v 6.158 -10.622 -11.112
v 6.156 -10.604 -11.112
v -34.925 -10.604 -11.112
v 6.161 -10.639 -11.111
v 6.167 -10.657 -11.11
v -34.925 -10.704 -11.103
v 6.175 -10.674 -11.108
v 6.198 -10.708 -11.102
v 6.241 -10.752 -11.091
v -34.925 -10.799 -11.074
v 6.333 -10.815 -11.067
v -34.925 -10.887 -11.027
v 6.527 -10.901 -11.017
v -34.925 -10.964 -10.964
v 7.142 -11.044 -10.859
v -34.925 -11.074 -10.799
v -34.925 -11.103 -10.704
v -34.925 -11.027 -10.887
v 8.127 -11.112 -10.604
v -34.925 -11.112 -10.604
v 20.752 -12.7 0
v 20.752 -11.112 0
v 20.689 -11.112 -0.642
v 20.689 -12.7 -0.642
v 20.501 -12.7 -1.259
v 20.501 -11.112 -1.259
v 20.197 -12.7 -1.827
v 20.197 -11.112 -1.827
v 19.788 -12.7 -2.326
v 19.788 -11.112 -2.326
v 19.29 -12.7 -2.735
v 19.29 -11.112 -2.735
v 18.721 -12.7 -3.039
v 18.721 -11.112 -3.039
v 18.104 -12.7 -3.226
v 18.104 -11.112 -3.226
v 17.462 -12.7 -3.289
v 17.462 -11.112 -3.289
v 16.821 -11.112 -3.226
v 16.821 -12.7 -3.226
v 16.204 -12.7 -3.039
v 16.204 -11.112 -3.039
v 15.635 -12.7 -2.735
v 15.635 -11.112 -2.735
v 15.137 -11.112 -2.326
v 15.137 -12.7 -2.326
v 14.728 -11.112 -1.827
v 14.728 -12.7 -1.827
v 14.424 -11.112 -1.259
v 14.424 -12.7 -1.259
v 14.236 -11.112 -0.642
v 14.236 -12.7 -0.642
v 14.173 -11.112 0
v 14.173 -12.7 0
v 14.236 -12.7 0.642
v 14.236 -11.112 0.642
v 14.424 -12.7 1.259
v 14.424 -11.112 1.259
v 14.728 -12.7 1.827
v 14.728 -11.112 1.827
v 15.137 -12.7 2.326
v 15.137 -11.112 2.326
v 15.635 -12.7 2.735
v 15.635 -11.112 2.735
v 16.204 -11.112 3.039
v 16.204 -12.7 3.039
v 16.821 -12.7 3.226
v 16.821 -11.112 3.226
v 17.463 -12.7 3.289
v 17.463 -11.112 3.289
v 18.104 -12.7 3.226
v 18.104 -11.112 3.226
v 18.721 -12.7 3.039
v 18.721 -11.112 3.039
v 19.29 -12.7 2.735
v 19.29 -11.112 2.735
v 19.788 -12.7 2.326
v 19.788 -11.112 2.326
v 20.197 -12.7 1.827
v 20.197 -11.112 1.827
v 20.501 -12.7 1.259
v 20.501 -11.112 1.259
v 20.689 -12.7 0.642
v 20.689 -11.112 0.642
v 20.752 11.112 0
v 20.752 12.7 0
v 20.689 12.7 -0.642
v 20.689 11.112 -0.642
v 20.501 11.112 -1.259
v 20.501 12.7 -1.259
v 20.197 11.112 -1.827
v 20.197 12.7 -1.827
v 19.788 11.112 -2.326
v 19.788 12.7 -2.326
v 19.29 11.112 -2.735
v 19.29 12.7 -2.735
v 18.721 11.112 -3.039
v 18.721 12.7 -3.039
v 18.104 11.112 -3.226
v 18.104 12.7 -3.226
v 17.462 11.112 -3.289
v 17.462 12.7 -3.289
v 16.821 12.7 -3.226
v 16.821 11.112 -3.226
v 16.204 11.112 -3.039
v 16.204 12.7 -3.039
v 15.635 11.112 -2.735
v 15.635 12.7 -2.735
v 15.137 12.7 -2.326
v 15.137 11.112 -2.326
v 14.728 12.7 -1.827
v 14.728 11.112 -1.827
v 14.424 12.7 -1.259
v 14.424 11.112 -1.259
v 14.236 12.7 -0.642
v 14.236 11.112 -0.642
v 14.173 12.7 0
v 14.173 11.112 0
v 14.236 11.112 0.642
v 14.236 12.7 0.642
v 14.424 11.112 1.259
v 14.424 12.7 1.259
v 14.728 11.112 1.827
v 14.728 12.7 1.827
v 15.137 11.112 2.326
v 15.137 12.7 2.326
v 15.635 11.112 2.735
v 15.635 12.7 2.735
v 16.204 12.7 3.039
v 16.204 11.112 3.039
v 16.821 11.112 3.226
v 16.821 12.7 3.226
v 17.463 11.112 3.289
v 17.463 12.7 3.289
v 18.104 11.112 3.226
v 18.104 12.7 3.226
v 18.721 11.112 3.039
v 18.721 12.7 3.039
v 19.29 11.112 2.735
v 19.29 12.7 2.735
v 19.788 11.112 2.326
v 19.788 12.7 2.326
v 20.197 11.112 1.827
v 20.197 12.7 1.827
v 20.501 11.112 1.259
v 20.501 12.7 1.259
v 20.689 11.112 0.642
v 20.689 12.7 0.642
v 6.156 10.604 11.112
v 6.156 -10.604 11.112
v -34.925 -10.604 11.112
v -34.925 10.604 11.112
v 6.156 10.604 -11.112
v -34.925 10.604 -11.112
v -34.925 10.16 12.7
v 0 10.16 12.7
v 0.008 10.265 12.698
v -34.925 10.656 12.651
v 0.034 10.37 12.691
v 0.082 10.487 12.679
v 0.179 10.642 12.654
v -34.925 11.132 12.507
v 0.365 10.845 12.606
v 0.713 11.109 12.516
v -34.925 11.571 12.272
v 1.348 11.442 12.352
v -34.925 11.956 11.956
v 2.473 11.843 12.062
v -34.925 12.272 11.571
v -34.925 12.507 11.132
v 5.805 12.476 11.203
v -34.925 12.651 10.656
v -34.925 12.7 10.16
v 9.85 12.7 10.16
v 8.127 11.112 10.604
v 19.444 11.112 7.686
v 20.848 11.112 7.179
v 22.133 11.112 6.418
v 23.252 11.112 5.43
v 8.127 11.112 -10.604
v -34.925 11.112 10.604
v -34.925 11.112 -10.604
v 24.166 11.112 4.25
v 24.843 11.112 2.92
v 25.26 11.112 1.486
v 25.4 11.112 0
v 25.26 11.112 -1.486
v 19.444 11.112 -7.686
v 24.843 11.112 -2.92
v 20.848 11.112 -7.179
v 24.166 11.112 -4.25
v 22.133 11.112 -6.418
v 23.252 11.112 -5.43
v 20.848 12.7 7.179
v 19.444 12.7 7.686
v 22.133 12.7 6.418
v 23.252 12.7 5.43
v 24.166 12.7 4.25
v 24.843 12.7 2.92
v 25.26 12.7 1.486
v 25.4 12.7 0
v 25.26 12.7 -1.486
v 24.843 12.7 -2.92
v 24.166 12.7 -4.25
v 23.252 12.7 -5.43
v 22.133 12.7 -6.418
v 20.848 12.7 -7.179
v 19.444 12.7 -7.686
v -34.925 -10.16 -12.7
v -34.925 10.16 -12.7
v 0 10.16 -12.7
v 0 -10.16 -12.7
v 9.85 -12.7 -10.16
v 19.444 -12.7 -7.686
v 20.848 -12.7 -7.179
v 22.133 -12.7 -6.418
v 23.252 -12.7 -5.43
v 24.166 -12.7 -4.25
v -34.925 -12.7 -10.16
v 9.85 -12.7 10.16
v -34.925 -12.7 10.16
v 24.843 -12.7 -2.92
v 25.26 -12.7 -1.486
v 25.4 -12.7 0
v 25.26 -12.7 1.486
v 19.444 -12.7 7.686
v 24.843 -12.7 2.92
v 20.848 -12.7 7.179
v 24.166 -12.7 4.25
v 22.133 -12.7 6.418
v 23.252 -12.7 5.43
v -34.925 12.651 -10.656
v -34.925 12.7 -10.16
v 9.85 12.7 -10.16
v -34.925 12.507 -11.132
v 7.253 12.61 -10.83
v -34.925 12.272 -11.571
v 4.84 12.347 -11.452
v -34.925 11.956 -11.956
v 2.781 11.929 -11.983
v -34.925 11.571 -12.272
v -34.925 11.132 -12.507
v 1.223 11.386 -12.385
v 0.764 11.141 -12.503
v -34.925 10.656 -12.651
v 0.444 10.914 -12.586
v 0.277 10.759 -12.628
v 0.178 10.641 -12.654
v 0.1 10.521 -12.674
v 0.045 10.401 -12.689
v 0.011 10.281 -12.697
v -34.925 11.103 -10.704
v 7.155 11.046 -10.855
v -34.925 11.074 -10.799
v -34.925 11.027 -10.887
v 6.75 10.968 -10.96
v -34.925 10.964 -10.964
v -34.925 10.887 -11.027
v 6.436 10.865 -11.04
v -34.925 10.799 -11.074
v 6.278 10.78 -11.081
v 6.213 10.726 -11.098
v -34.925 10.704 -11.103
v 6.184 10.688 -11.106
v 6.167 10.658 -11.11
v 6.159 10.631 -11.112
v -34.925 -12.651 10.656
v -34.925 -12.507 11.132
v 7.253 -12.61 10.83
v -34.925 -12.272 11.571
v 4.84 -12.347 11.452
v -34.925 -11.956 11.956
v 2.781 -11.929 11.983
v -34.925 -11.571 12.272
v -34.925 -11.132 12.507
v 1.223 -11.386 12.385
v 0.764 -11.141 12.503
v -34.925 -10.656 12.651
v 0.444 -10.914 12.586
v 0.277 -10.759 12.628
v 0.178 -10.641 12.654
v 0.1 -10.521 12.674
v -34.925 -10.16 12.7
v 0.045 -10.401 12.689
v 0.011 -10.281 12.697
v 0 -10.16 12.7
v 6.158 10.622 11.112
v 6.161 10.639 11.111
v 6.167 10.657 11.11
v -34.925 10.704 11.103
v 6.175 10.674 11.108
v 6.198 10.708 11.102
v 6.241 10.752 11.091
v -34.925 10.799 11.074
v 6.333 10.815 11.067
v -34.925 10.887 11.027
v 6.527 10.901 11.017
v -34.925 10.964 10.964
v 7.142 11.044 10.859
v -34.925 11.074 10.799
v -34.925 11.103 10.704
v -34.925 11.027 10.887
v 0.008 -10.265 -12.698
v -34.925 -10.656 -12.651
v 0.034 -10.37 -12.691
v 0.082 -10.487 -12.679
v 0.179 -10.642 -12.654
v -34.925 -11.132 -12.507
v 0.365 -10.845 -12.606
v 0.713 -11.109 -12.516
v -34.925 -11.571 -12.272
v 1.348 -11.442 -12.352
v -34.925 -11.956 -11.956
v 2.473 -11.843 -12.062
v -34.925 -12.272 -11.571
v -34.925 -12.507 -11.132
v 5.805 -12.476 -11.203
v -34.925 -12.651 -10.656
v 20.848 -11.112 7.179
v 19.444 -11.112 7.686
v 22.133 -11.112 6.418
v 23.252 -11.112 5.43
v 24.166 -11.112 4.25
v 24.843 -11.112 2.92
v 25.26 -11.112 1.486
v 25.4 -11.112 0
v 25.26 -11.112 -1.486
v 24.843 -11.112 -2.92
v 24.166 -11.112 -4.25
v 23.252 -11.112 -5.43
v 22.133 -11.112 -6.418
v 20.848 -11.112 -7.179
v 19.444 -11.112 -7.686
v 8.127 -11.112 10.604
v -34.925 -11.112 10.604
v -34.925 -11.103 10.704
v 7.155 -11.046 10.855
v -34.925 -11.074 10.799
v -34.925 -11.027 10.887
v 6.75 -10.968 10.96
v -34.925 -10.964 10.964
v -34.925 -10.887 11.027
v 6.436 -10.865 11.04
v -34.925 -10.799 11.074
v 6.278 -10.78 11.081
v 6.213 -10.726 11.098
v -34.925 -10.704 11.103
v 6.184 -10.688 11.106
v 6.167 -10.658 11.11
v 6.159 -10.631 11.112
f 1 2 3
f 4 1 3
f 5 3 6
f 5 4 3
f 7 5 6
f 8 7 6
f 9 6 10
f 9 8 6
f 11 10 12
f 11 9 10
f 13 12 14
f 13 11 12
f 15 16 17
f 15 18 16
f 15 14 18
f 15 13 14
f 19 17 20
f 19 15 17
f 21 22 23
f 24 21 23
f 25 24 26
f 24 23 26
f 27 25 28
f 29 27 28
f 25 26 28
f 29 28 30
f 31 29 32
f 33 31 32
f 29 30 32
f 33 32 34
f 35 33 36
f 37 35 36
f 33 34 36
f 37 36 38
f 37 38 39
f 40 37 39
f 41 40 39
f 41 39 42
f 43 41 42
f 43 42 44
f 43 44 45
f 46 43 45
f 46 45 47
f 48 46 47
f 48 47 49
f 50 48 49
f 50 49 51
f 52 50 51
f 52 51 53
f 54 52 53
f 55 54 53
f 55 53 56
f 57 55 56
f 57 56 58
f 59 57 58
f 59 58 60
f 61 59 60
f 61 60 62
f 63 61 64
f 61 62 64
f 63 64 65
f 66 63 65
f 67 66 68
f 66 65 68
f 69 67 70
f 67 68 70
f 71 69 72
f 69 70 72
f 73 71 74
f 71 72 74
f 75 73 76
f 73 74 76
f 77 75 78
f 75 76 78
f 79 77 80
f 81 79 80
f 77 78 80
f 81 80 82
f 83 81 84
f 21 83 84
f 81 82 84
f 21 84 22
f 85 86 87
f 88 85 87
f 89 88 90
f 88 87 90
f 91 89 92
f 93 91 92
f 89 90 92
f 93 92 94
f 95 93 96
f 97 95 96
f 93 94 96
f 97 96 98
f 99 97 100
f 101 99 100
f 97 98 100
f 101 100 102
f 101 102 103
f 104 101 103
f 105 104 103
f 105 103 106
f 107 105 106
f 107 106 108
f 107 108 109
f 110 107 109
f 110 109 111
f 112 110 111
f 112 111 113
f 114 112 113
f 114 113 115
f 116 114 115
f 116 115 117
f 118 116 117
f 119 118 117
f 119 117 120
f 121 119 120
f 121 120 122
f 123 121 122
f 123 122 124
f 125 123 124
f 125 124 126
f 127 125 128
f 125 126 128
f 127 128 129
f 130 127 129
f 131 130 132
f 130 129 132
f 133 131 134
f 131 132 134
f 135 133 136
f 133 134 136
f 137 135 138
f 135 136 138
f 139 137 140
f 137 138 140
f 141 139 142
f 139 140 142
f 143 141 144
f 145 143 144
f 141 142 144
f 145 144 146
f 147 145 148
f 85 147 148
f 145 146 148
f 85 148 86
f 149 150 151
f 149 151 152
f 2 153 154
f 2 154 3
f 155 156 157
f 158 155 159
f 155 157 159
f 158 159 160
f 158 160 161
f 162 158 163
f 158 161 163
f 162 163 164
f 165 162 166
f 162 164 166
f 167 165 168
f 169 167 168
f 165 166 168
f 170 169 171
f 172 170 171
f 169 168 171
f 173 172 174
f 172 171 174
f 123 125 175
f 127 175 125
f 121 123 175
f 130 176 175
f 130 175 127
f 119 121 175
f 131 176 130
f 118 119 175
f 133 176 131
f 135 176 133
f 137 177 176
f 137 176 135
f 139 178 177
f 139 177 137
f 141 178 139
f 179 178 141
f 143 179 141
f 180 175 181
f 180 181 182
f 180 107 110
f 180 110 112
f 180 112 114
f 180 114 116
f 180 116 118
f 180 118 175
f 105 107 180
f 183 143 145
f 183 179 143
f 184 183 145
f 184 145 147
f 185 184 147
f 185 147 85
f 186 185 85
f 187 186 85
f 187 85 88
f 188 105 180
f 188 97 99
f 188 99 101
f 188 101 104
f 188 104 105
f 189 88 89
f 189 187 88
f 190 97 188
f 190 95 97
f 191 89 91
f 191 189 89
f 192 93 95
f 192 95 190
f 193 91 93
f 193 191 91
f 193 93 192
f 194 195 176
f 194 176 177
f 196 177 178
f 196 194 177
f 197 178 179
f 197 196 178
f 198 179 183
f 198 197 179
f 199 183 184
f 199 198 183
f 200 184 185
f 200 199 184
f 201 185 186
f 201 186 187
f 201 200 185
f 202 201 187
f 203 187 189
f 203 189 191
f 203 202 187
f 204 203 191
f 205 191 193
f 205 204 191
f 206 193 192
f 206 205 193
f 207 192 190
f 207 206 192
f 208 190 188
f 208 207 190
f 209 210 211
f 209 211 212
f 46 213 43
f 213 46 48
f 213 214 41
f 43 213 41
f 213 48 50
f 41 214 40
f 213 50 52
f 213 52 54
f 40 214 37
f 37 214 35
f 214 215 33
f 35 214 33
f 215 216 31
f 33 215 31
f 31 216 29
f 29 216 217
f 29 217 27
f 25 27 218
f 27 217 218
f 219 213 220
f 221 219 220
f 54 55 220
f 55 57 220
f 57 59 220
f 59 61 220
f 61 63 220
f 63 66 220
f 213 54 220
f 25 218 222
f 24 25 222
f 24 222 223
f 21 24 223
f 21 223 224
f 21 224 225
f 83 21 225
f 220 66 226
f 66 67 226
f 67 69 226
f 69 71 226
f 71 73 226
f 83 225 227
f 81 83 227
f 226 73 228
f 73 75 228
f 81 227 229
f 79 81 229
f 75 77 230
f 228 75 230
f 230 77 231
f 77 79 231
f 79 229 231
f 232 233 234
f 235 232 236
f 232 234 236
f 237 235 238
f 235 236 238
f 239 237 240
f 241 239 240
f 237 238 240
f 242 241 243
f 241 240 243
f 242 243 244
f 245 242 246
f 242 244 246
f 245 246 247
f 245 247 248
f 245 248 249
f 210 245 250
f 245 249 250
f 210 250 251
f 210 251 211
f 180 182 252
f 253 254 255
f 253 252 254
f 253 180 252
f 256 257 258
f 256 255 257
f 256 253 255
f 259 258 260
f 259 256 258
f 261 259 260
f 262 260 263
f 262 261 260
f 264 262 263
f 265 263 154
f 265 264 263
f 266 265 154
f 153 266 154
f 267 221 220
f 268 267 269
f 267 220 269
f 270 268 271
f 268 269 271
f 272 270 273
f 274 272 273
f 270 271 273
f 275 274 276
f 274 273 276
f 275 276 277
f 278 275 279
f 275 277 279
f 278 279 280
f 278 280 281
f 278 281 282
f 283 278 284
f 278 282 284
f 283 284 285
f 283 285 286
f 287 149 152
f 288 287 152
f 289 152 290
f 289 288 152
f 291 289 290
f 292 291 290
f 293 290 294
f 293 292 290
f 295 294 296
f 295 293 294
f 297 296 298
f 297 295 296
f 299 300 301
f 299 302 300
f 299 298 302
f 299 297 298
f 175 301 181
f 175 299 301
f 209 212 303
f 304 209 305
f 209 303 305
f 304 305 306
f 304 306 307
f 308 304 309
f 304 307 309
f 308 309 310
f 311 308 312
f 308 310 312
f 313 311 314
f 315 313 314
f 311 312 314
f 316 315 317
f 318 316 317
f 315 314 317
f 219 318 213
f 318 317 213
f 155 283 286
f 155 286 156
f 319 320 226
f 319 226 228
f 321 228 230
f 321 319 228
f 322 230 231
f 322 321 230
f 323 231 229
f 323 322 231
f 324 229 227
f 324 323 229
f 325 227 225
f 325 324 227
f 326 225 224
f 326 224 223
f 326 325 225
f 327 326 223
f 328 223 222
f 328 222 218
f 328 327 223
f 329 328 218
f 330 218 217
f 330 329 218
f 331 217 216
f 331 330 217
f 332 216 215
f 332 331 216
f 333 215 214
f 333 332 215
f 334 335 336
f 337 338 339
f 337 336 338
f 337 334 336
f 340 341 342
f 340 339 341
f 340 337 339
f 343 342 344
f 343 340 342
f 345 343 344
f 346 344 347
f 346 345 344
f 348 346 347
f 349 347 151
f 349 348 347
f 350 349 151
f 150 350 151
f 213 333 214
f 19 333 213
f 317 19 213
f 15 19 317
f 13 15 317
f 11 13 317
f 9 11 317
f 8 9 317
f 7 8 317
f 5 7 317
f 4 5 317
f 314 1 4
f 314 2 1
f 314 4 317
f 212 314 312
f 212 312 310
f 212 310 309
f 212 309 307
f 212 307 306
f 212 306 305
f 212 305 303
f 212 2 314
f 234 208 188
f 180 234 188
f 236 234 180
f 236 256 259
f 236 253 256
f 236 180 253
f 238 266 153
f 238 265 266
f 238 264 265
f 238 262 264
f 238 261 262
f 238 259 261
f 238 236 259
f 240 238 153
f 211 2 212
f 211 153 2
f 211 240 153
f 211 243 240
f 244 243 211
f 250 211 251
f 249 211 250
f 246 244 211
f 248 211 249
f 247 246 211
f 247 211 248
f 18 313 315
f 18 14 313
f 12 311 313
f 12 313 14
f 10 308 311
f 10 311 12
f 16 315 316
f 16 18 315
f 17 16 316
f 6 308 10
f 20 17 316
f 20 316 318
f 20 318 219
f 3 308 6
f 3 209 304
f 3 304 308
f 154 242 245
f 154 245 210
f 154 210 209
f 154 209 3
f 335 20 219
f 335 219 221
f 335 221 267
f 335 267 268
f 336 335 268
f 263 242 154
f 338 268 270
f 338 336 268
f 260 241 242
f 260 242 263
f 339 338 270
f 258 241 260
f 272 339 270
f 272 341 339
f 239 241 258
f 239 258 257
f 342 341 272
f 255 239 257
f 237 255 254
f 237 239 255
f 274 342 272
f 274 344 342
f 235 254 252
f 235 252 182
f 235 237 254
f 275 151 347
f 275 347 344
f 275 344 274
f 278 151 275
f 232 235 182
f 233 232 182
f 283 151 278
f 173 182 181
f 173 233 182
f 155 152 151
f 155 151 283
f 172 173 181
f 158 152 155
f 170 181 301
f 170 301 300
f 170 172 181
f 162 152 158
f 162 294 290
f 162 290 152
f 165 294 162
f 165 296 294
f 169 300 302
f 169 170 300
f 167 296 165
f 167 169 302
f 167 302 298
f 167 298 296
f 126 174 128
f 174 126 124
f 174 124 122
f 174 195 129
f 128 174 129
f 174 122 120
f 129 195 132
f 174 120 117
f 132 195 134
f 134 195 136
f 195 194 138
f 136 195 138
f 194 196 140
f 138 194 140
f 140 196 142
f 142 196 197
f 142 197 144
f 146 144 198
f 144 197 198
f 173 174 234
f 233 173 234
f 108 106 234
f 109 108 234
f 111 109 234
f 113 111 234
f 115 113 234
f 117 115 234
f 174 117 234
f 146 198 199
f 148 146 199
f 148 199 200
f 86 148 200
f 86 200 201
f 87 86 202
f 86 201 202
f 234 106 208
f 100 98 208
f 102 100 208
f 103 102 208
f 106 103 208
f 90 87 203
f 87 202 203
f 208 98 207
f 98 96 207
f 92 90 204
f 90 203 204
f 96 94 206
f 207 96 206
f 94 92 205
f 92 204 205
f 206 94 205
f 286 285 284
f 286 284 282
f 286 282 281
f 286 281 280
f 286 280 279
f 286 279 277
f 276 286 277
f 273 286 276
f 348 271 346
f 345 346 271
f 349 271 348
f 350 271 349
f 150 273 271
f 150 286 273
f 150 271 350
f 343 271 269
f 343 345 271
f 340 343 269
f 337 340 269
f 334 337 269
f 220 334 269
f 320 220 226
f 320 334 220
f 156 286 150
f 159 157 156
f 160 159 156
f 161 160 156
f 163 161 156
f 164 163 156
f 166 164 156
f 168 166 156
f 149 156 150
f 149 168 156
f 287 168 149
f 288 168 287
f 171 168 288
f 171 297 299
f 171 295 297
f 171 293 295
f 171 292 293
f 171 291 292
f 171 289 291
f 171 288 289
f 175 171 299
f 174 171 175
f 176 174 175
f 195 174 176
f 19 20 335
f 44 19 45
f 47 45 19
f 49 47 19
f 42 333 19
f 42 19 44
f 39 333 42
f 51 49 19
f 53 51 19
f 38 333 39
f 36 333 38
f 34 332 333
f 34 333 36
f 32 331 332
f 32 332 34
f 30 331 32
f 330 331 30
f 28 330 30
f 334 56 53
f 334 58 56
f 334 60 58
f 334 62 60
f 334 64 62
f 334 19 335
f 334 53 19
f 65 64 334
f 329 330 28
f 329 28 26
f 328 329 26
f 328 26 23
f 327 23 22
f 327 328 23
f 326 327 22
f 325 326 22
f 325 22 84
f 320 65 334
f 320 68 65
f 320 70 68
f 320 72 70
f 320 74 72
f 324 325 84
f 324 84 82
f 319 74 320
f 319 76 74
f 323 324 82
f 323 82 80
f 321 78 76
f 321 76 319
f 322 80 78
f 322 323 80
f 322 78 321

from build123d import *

# Parameters (mm, degrees)
BOSS_EXTRUDE1_DEPTH      = 25.4
BOSS_EXTRUDE1_DEPTH_BACK = 34.925
CUT_EXTRUDE4_DEPTH       = 61.325
CUT_EXTRUDE5_DEPTH       = 26.4
SKETCH14_R               = 3.2893
CUT_EXTRUDE6_DEPTH       = 26.4


with BuildPart() as part:
    # Sketch1 → Boss-Extrude1 (new body, two sides)
    with BuildSketch(Plane(origin=(0, 0, 0), x_dir=(0, 0, -1), z_dir=(1, 0, 0))) as boss_extrude1_sk:
        with BuildLine():
            Line((-10.16, 12.7), (10.16, 12.7))
            ThreePointArc((10.16, 12.7), (11.956051224, 11.956051224), (12.7, 10.16))
            Line((12.7, 10.16), (12.7, -10.16))
            ThreePointArc((12.7, -10.16), (11.956051224, -11.956051224), (10.16, -12.7))
            Line((10.16, -12.7), (-10.16, -12.7))
            ThreePointArc((-10.16, -12.7), (-11.956051224, -11.956051224), (-12.7, -10.16))
            Line((-12.7, -10.16), (-12.7, 10.16))
            ThreePointArc((-12.7, 10.16), (-11.956051224, 11.956051224), (-10.16, 12.7))
        make_face()
    extrude(amount=BOSS_EXTRUDE1_DEPTH)
    extrude(boss_extrude1_sk.sketch, amount=-BOSS_EXTRUDE1_DEPTH_BACK)

    # Sketch11 → Cut-Extrude4 (cut, through all)
    with BuildSketch(Plane(origin=(25.4, 0, 0), x_dir=(0, 0, -1), z_dir=(1, 0, 0))):
        with BuildLine():
            Line((-10.6045, 11.1125), (10.6045, 11.1125))
            ThreePointArc((10.6045, 11.1125), (10.963710245, 10.963710245), (11.1125, 10.6045))
            Line((11.1125, 10.6045), (11.1125, -10.6045))
            ThreePointArc((11.1125, -10.6045), (10.963710245, -10.963710245), (10.6045, -11.1125))
            Line((10.6045, -11.1125), (-10.6045, -11.1125))
            ThreePointArc((-10.6045, -11.1125), (-10.963710245, -10.963710245), (-11.1125, -10.6045))
            Line((-11.1125, -10.6045), (-11.1125, 10.6045))
            ThreePointArc((-11.1125, 10.6045), (-10.963710245, 10.963710245), (-10.6045, 11.1125))
        make_face()
    extrude(amount=-CUT_EXTRUDE4_DEPTH, mode=Mode.SUBTRACT)

    # Sketch12 → Cut-Extrude5 (cut, through all)
    with BuildSketch(Plane(origin=(0, 12.7, 0), x_dir=(1, 0, 0), z_dir=(0, 1, 0))):
        with BuildLine():
            Line((0, 12.7), (50.8, 12.7))
            Line((50.8, 12.7), (50.8, -12.7))
            Line((50.8, -12.7), (0, -12.7))
            Line((0, -12.7), (19.444424463, -7.686083637))
            ThreePointArc((19.444424463, -7.686083637), (25.4, 0), (19.444424463, 7.686083637))
            Line((19.444424463, 7.686083637), (0, 12.7))
        make_face()
    extrude(amount=-CUT_EXTRUDE5_DEPTH, mode=Mode.SUBTRACT)

    # Sketch14 → Cut-Extrude6 (cut, through all)
    with BuildSketch(Plane(origin=(0, 12.7, 0), x_dir=(1, 0, 0), z_dir=(0, 1, 0))):
        with Locations((17.4625, 0)):
            Circle(SKETCH14_R)
    extrude(amount=-CUT_EXTRUDE6_DEPTH, mode=Mode.SUBTRACT)


solid = part.part
